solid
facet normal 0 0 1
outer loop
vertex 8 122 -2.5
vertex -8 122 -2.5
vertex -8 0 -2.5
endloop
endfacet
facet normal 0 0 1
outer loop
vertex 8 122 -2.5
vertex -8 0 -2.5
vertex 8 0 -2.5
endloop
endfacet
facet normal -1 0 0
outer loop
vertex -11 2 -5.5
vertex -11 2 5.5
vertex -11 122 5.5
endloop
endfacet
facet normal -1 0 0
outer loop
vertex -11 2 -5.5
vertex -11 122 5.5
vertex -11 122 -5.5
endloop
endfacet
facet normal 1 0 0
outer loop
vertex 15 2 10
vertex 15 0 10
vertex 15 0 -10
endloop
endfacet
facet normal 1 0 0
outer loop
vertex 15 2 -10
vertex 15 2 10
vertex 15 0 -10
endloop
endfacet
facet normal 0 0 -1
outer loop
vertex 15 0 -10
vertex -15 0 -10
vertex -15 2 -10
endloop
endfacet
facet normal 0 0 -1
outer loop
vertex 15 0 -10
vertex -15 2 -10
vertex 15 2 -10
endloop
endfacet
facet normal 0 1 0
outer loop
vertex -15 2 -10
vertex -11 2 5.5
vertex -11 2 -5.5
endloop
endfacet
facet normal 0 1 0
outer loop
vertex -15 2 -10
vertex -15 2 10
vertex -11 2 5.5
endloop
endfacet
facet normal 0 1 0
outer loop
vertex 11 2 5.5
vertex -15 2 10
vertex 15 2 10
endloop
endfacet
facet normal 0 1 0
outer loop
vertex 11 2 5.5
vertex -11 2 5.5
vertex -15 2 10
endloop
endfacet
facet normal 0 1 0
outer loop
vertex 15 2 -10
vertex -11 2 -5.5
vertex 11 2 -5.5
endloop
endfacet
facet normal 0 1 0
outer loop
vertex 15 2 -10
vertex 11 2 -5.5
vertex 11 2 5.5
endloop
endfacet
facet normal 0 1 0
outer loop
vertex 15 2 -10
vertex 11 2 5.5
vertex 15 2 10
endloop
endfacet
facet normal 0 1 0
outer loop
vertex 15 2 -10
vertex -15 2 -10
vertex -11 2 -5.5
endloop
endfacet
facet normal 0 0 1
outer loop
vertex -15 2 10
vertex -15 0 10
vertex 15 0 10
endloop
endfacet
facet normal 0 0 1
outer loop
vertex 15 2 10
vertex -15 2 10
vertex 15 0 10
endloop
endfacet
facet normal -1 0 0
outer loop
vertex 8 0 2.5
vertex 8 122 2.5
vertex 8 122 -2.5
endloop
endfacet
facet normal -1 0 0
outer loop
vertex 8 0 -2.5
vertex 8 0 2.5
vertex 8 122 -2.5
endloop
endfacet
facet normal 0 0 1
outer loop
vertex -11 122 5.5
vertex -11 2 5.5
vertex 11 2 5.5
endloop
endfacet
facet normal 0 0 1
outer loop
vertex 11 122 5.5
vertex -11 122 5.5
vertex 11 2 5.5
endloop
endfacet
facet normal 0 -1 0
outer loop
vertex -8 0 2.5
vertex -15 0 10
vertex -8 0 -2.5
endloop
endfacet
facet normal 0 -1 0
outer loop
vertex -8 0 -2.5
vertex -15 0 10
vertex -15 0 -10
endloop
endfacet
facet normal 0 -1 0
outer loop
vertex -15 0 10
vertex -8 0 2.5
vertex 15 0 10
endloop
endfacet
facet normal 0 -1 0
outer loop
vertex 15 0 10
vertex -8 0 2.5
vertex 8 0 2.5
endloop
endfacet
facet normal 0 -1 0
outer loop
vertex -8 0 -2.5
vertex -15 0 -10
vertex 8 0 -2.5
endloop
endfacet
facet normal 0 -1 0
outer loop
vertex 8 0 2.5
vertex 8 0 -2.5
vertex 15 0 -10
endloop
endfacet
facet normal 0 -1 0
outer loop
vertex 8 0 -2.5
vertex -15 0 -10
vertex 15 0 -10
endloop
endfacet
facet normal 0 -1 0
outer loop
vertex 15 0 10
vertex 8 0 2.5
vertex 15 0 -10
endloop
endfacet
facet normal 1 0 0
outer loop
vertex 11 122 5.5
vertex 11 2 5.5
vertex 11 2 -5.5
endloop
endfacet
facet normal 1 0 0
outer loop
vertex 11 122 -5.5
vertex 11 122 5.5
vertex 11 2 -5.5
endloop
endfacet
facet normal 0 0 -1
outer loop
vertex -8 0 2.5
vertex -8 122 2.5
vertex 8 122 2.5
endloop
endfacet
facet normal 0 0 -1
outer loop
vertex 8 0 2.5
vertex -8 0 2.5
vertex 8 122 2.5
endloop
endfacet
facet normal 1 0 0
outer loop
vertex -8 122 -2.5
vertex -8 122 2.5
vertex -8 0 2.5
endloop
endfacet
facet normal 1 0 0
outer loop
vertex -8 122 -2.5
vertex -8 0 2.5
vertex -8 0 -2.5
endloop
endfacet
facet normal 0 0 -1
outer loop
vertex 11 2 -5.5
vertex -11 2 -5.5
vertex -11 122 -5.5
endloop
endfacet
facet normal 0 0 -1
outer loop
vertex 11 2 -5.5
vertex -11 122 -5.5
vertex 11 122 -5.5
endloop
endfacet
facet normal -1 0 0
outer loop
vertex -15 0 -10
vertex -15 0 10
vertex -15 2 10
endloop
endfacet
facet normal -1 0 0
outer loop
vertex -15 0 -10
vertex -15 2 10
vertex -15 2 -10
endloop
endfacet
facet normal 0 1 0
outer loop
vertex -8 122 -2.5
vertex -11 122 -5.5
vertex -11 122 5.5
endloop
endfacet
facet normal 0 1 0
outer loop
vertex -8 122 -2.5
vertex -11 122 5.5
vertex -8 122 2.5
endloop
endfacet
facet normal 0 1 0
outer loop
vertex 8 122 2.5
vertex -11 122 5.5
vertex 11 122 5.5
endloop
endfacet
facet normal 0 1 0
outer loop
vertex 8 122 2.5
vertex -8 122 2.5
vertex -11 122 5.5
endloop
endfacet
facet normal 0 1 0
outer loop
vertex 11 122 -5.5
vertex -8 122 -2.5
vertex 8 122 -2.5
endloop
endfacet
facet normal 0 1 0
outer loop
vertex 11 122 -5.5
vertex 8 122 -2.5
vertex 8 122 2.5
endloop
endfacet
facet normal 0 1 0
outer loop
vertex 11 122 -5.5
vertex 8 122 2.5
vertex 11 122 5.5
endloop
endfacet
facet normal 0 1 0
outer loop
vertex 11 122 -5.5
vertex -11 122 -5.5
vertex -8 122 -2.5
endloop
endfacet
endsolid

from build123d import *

# Parameters (mm, degrees)
CROQUIS1_W              = 30
CROQUIS1_H              = 20
SALIENTE_EXTRUIR1_DEPTH = 2
CROQUIS2_W              = 22
CROQUIS2_H              = 11
CROQUIS2_W_2            = 16
CROQUIS2_H_2            = 5
SALIENTE_EXTRUIR2_DEPTH = 120
CROQUIS3_W              = 16
CROQUIS3_H              = 5
CORTAR_EXTRUIR1_DEPTH   = 123


with BuildPart() as part:
    # Croquis1 → Saliente-Extruir1 (new body)
    with BuildSketch(Plane(origin=(0, 0, 0), x_dir=(1, 0, 0), z_dir=(0, 1, 0))):
        Rectangle(CROQUIS1_W, CROQUIS1_H)
    extrude(amount=SALIENTE_EXTRUIR1_DEPTH)

    # Croquis2 → Saliente-Extruir2 (add)
    with BuildSketch(Plane(origin=(0, 2, 0), x_dir=(1, 0, 0), z_dir=(0, 1, 0))):
        Rectangle(CROQUIS2_W, CROQUIS2_H)
        Rectangle(CROQUIS2_W_2, CROQUIS2_H_2, mode=Mode.SUBTRACT)
    extrude(amount=SALIENTE_EXTRUIR2_DEPTH)

    # Croquis3 → Cortar-Extruir1 (cut, through all)
    with BuildSketch(Plane(origin=(0, 122, 0), x_dir=(1, 0, 0), z_dir=(0, 1, 0))):
        Rectangle(CROQUIS3_W, CROQUIS3_H)
    extrude(amount=-CORTAR_EXTRUIR1_DEPTH, mode=Mode.SUBTRACT)


solid = part.part
